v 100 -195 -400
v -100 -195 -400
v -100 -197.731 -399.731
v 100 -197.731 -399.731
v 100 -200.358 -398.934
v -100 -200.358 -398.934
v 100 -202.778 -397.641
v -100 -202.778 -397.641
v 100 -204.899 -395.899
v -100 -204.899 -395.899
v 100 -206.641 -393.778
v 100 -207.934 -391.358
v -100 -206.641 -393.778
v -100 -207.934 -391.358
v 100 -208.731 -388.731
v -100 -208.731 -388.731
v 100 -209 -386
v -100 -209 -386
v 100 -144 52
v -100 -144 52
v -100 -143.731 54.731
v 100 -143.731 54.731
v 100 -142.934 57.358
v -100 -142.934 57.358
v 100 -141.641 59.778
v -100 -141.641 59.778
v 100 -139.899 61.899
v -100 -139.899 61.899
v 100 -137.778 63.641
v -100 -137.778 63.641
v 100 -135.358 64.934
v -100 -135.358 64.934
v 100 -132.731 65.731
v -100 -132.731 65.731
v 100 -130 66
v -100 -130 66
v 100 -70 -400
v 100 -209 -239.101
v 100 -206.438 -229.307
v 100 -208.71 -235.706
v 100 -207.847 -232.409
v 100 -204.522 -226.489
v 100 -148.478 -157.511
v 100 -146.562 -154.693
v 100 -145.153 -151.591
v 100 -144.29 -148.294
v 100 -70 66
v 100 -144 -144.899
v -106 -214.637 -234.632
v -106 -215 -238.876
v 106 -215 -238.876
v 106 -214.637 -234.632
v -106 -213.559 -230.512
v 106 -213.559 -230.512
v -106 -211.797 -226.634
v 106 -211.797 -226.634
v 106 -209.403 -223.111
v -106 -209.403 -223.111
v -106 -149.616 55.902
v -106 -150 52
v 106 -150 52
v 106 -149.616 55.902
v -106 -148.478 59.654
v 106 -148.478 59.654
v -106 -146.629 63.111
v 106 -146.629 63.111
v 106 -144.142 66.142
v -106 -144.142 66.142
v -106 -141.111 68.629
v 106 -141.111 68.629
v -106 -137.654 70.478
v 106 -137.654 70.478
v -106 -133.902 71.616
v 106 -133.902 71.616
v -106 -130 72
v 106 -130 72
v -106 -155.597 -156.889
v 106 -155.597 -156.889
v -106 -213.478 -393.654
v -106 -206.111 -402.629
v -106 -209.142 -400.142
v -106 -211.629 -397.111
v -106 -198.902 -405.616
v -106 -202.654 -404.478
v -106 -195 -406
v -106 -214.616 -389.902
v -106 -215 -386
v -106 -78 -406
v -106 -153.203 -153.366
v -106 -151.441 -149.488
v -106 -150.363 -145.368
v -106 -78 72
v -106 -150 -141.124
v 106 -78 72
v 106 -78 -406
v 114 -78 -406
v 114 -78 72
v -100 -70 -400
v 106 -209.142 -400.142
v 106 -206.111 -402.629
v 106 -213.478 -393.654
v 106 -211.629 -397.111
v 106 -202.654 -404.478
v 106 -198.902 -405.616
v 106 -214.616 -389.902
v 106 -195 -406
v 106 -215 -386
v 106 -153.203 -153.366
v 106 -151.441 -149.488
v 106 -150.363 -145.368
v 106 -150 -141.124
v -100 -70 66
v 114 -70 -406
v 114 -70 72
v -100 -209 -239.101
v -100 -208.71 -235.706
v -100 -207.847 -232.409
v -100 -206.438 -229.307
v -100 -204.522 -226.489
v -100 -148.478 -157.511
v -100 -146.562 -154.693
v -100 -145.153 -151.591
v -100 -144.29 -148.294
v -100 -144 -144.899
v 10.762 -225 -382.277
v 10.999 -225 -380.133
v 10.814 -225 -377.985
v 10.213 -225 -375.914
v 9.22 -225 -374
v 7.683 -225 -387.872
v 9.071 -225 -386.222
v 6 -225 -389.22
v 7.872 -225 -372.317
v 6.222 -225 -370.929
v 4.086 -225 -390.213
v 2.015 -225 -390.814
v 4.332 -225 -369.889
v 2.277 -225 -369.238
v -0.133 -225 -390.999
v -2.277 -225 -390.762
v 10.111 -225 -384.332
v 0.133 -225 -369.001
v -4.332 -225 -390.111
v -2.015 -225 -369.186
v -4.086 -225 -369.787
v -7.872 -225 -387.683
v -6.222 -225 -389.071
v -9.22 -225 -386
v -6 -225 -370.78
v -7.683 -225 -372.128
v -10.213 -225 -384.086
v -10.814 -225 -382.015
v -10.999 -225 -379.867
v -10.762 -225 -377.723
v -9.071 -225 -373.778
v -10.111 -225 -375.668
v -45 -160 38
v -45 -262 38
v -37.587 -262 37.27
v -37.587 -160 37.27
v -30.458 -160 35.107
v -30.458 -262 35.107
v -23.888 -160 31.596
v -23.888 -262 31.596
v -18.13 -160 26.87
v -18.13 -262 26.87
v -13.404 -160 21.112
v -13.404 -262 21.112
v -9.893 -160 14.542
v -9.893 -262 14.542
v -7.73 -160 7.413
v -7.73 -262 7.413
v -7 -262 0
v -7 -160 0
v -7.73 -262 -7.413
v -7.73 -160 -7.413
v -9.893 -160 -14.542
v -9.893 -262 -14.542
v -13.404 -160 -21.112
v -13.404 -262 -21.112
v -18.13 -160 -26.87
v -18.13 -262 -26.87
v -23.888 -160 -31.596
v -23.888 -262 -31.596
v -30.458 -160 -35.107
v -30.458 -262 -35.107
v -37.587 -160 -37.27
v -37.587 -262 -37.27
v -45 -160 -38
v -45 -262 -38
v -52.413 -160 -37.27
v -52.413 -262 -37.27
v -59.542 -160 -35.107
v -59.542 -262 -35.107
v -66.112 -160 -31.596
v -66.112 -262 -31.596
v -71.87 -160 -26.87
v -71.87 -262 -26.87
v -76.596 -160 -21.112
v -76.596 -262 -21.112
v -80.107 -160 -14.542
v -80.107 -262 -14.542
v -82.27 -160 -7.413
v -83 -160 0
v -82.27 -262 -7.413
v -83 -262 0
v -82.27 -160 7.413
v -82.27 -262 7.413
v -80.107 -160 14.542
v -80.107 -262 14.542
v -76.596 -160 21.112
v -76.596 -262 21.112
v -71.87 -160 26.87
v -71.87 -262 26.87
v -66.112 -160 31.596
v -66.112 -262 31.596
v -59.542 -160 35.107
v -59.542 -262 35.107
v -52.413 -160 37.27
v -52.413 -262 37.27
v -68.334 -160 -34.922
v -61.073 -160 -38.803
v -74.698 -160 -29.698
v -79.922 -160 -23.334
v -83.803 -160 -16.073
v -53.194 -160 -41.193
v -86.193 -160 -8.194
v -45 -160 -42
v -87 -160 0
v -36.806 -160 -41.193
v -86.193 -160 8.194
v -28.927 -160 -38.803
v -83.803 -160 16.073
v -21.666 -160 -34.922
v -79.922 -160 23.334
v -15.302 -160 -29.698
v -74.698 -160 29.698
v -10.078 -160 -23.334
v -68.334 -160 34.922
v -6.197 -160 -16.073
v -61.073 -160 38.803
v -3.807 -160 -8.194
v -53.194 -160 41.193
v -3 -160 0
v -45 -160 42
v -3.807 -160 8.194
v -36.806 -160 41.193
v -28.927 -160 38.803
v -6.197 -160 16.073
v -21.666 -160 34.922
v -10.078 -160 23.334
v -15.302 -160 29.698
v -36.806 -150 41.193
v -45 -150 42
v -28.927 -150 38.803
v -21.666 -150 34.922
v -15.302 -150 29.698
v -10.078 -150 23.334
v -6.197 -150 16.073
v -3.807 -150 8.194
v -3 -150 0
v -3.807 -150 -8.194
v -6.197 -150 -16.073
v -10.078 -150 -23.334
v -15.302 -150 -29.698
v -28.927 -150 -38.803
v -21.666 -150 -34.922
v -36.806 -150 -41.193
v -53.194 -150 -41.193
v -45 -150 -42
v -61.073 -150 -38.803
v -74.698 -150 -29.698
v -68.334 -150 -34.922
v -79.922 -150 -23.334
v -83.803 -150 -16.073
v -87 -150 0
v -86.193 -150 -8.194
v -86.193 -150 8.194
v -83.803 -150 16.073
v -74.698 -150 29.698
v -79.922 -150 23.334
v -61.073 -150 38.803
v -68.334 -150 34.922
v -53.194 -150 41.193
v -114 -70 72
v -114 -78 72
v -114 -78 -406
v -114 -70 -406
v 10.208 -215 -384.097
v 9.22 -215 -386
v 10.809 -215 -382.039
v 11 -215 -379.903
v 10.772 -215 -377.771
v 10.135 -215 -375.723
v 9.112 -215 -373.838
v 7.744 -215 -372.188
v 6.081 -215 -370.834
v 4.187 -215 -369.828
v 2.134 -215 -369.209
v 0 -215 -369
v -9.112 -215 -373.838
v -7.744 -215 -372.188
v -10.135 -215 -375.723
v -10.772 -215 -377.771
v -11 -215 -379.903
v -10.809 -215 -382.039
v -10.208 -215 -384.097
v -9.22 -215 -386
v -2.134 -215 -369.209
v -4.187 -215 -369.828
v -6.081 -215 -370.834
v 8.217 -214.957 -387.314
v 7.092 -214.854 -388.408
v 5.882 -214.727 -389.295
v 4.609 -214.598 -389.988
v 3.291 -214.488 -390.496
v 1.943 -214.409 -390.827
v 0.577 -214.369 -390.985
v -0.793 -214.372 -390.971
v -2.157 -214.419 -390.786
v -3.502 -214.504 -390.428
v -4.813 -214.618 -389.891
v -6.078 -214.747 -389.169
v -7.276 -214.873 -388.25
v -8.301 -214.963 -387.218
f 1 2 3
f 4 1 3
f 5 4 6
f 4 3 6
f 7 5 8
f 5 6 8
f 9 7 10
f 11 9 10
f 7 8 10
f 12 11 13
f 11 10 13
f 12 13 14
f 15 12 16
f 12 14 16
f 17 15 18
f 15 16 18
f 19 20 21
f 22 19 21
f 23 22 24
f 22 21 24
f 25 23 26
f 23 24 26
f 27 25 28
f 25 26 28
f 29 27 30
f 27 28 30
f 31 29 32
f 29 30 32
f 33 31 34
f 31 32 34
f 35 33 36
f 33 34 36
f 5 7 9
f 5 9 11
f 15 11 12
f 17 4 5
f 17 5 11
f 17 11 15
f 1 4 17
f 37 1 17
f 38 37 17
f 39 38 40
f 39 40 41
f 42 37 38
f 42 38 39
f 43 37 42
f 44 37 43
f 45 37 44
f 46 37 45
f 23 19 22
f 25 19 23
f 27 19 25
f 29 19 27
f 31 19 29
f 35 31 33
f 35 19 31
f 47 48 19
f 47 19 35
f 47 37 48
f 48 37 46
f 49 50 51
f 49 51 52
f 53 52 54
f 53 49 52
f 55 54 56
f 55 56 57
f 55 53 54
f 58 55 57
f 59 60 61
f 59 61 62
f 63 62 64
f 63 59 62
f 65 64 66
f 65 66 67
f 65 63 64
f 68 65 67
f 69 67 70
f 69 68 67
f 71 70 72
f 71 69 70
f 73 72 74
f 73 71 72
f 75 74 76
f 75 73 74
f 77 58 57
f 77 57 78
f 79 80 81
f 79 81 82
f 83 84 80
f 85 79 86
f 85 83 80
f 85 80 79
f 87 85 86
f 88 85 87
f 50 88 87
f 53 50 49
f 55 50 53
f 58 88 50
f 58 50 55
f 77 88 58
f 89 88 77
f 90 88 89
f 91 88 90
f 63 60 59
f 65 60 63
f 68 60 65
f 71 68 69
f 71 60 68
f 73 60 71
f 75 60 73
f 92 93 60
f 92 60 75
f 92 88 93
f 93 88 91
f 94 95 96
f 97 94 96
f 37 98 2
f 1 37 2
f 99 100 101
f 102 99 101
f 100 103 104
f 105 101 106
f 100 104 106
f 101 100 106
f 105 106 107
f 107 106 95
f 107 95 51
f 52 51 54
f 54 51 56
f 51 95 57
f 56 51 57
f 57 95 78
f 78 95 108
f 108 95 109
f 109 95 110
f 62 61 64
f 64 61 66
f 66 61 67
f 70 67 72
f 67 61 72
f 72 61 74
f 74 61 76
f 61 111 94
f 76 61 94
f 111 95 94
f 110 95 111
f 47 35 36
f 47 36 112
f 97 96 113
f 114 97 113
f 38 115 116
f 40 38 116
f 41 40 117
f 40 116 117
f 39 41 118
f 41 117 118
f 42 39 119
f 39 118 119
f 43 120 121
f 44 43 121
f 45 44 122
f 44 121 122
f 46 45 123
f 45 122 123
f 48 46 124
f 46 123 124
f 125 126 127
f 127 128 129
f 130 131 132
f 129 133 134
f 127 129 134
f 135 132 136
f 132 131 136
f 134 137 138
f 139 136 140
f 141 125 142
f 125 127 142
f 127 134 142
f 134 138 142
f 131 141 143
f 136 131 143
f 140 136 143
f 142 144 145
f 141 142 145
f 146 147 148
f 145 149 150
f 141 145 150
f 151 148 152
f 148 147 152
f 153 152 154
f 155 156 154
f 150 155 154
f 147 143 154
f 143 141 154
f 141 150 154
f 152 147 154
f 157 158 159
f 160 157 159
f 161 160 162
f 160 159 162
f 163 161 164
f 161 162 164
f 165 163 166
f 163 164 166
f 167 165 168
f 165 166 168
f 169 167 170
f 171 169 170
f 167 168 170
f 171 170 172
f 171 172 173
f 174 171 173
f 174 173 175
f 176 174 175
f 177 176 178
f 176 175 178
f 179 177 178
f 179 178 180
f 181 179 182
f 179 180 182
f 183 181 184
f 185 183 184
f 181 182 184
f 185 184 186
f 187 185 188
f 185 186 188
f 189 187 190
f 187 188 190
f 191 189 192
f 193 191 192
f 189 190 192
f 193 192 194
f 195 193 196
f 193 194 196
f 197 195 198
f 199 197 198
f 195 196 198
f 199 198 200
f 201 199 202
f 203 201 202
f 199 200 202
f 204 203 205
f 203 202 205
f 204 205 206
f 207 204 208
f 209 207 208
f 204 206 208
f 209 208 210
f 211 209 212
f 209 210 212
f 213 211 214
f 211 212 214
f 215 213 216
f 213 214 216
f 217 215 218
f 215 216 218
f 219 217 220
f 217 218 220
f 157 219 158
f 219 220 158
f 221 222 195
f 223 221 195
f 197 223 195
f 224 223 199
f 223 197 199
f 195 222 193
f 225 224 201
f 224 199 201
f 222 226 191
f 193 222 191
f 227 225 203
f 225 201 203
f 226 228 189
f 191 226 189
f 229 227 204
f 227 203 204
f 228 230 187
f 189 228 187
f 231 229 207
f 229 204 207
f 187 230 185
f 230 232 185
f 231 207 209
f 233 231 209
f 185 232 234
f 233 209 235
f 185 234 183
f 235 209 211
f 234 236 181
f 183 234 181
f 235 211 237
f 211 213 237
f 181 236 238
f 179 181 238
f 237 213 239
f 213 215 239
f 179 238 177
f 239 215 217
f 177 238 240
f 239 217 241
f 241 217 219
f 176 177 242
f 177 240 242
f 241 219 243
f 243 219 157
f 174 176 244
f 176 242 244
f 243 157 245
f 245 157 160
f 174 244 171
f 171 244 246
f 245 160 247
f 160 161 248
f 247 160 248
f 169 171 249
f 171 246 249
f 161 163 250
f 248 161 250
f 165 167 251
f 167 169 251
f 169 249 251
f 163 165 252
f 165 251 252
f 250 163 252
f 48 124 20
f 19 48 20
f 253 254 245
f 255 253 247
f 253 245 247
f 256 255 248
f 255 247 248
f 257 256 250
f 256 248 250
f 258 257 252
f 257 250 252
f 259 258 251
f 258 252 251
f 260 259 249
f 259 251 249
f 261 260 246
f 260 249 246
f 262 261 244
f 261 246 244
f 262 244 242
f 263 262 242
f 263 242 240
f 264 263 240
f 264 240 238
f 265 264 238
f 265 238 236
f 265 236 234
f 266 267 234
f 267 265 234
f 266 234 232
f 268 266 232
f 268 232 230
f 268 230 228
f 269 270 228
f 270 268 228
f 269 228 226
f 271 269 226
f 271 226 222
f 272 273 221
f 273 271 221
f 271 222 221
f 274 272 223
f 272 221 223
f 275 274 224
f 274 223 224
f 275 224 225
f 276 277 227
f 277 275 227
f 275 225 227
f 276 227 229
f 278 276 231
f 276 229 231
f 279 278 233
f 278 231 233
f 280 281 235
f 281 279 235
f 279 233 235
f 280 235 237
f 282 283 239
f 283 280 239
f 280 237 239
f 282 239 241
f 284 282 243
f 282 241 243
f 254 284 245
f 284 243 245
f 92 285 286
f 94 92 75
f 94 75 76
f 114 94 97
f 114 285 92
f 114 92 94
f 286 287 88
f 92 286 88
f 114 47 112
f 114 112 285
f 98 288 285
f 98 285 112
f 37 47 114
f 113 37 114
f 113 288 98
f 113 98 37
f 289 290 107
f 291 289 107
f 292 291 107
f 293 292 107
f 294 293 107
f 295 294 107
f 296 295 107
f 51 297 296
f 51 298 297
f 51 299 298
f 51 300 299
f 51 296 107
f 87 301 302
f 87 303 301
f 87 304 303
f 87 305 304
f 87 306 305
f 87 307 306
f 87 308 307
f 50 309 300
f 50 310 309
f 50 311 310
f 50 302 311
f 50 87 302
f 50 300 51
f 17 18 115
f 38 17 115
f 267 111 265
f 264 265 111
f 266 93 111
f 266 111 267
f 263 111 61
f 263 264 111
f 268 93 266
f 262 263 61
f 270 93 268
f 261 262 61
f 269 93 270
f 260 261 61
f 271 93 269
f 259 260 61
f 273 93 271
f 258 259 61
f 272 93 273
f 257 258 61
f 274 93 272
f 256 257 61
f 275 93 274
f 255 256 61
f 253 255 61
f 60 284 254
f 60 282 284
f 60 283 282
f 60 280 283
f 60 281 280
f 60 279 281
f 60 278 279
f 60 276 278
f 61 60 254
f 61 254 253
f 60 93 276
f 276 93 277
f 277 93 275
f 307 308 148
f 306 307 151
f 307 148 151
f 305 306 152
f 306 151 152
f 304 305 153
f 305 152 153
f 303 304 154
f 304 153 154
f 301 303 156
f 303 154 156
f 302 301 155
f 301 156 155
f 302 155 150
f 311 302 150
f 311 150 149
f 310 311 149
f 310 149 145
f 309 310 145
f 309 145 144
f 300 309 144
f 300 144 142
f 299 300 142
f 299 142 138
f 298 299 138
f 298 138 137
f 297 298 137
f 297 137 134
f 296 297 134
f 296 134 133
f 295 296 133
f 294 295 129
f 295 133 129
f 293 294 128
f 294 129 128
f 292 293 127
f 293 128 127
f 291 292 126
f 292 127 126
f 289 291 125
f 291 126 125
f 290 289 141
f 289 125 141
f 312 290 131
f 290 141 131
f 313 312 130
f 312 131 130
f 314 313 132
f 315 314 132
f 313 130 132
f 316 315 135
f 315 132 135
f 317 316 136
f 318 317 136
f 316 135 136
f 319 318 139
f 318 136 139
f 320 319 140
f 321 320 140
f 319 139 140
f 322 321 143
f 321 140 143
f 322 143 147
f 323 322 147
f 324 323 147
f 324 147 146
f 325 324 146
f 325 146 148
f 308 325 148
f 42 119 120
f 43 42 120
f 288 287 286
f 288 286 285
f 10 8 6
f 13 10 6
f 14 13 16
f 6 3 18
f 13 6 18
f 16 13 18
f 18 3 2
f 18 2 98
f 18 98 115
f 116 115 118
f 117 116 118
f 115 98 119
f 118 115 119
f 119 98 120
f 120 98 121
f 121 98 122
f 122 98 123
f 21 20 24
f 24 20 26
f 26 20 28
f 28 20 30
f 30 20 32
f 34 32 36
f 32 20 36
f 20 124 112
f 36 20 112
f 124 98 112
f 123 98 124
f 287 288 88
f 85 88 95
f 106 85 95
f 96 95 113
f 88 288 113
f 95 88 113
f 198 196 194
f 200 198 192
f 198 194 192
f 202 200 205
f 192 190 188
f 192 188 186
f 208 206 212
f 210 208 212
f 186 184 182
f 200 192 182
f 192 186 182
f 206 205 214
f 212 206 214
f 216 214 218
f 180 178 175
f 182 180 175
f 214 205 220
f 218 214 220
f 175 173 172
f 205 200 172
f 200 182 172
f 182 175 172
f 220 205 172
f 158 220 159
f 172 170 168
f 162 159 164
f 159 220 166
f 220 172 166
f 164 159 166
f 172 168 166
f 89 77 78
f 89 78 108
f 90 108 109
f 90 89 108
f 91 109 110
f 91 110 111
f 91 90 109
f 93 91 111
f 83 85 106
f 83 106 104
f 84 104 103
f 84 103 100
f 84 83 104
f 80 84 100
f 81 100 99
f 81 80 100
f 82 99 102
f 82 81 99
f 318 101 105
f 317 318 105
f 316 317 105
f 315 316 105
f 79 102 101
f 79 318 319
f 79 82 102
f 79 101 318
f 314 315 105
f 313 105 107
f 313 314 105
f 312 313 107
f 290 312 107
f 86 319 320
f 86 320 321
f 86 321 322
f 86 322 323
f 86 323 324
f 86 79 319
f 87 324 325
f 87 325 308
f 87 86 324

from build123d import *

# Parameters (mm, degrees)
PAN_START            = -106
PAN_BODY_DEPTH       = 212
PAN_START_2          = -406
SKETCH2_W            = 228
SKETCH2_H            = 8
PAN_RAIL_DEPTH       = 478
SUMP_START           = -100
SUMP_DEPTH           = 200
DRAIN_START          = -225
SKETCH4_R            = 11
DRAIN_PLUG_DEPTH     = 11
FILTER_START         = -160
SKETCH5_R            = 42
FILTER_ADAPTER_DEPTH = 11
OIL_START            = -262
SKETCH6_R            = 38
OIL_FILTER_DEPTH     = 102


with BuildPart() as part:
    # Sketch1 → Pan Body (new body)
    with BuildSketch(Plane(origin=(0, 0, 0), x_dir=(0, 0, -1), z_dir=(1, 0, 0)).offset(PAN_START)):
        with BuildLine():
            Line((-72, -70), (406, -70))
            Line((406, -70), (406, -195))
            ThreePointArc((406, -195), (400.142135624, -209.142135624), (386, -215))
            Line((386, -215), (238.876015631, -215))
            ThreePointArc((238.876015631, -215), (230.51154464, -213.559194066), (223.111200004, -209.402850003))
            Line((223.111200004, -209.402850003), (156.888799996, -155.597149997))
            ThreePointArc((156.888799996, -155.597149997), (149.48845536, -151.440805934), (141.123984369, -150))
            Line((141.123984369, -150), (-52, -150))
            ThreePointArc((-52, -150), (-66.142135624, -144.142135624), (-72, -130))
            Line((-72, -130), (-72, -70))
        make_face()
    extrude(amount=PAN_BODY_DEPTH)

    # Sketch2 → Pan Rail (add)
    with BuildSketch(Plane.XY.offset(PAN_START_2)):
        with Locations((0, -74)):
            Rectangle(SKETCH2_W, SKETCH2_H)
    extrude(amount=PAN_RAIL_DEPTH)

    # Sketch3 → Sump (cut)
    with BuildSketch(Plane(origin=(0, 0, 0), x_dir=(0, 0, -1), z_dir=(1, 0, 0)).offset(SUMP_START)):
        with BuildLine():
            Line((-66, -60), (400, -60))
            Line((400, -60), (400, -195))
            ThreePointArc((400, -195), (395.899494937, -204.899494937), (386, -209))
            Line((386, -209), (239.100812505, -209))
            ThreePointArc((239.100812505, -209), (232.409235712, -207.847355253), (226.488960003, -204.522280002))
            Line((226.488960003, -204.522280002), (157.511039997, -148.477719998))
            ThreePointArc((157.511039997, -148.477719998), (151.590764288, -145.152644747), (144.899187495, -144))
            Line((144.899187495, -144), (-52, -144))
            ThreePointArc((-52, -144), (-61.899494937, -139.899494937), (-66, -130))
            Line((-66, -130), (-66, -60))
        make_face()
    extrude(amount=SUMP_DEPTH, mode=Mode.SUBTRACT)

    # Sketch4 → Drain Plug (add)
    with BuildSketch(Plane(origin=(0, 0, 0), x_dir=(1, 0, 0), z_dir=(0, 1, 0)).offset(DRAIN_START)):
        with Locations(Location((0, 380, 0), (0, 0, 146.944268849))):
            Circle(SKETCH4_R)
    extrude(amount=DRAIN_PLUG_DEPTH)

    # Sketch5 → Filter Adapter (add)
    with BuildSketch(Plane(origin=(0, 0, 0), x_dir=(1, 0, 0), z_dir=(0, 1, 0)).offset(FILTER_START)):
        with Locations(Location((-45, 0, 0), (0, 0, 270))):
            Circle(SKETCH5_R)
    extrude(amount=FILTER_ADAPTER_DEPTH)

    # Sketch6 → Oil Filter (add)
    with BuildSketch(Plane(origin=(0, 0, 0), x_dir=(1, 0, 0), z_dir=(0, 1, 0)).offset(OIL_START)):
        with Locations(Location((-45, 0, 0), (0, 0, 270))):
            Circle(SKETCH6_R)
    extrude(amount=OIL_FILTER_DEPTH)


solid = part.part
